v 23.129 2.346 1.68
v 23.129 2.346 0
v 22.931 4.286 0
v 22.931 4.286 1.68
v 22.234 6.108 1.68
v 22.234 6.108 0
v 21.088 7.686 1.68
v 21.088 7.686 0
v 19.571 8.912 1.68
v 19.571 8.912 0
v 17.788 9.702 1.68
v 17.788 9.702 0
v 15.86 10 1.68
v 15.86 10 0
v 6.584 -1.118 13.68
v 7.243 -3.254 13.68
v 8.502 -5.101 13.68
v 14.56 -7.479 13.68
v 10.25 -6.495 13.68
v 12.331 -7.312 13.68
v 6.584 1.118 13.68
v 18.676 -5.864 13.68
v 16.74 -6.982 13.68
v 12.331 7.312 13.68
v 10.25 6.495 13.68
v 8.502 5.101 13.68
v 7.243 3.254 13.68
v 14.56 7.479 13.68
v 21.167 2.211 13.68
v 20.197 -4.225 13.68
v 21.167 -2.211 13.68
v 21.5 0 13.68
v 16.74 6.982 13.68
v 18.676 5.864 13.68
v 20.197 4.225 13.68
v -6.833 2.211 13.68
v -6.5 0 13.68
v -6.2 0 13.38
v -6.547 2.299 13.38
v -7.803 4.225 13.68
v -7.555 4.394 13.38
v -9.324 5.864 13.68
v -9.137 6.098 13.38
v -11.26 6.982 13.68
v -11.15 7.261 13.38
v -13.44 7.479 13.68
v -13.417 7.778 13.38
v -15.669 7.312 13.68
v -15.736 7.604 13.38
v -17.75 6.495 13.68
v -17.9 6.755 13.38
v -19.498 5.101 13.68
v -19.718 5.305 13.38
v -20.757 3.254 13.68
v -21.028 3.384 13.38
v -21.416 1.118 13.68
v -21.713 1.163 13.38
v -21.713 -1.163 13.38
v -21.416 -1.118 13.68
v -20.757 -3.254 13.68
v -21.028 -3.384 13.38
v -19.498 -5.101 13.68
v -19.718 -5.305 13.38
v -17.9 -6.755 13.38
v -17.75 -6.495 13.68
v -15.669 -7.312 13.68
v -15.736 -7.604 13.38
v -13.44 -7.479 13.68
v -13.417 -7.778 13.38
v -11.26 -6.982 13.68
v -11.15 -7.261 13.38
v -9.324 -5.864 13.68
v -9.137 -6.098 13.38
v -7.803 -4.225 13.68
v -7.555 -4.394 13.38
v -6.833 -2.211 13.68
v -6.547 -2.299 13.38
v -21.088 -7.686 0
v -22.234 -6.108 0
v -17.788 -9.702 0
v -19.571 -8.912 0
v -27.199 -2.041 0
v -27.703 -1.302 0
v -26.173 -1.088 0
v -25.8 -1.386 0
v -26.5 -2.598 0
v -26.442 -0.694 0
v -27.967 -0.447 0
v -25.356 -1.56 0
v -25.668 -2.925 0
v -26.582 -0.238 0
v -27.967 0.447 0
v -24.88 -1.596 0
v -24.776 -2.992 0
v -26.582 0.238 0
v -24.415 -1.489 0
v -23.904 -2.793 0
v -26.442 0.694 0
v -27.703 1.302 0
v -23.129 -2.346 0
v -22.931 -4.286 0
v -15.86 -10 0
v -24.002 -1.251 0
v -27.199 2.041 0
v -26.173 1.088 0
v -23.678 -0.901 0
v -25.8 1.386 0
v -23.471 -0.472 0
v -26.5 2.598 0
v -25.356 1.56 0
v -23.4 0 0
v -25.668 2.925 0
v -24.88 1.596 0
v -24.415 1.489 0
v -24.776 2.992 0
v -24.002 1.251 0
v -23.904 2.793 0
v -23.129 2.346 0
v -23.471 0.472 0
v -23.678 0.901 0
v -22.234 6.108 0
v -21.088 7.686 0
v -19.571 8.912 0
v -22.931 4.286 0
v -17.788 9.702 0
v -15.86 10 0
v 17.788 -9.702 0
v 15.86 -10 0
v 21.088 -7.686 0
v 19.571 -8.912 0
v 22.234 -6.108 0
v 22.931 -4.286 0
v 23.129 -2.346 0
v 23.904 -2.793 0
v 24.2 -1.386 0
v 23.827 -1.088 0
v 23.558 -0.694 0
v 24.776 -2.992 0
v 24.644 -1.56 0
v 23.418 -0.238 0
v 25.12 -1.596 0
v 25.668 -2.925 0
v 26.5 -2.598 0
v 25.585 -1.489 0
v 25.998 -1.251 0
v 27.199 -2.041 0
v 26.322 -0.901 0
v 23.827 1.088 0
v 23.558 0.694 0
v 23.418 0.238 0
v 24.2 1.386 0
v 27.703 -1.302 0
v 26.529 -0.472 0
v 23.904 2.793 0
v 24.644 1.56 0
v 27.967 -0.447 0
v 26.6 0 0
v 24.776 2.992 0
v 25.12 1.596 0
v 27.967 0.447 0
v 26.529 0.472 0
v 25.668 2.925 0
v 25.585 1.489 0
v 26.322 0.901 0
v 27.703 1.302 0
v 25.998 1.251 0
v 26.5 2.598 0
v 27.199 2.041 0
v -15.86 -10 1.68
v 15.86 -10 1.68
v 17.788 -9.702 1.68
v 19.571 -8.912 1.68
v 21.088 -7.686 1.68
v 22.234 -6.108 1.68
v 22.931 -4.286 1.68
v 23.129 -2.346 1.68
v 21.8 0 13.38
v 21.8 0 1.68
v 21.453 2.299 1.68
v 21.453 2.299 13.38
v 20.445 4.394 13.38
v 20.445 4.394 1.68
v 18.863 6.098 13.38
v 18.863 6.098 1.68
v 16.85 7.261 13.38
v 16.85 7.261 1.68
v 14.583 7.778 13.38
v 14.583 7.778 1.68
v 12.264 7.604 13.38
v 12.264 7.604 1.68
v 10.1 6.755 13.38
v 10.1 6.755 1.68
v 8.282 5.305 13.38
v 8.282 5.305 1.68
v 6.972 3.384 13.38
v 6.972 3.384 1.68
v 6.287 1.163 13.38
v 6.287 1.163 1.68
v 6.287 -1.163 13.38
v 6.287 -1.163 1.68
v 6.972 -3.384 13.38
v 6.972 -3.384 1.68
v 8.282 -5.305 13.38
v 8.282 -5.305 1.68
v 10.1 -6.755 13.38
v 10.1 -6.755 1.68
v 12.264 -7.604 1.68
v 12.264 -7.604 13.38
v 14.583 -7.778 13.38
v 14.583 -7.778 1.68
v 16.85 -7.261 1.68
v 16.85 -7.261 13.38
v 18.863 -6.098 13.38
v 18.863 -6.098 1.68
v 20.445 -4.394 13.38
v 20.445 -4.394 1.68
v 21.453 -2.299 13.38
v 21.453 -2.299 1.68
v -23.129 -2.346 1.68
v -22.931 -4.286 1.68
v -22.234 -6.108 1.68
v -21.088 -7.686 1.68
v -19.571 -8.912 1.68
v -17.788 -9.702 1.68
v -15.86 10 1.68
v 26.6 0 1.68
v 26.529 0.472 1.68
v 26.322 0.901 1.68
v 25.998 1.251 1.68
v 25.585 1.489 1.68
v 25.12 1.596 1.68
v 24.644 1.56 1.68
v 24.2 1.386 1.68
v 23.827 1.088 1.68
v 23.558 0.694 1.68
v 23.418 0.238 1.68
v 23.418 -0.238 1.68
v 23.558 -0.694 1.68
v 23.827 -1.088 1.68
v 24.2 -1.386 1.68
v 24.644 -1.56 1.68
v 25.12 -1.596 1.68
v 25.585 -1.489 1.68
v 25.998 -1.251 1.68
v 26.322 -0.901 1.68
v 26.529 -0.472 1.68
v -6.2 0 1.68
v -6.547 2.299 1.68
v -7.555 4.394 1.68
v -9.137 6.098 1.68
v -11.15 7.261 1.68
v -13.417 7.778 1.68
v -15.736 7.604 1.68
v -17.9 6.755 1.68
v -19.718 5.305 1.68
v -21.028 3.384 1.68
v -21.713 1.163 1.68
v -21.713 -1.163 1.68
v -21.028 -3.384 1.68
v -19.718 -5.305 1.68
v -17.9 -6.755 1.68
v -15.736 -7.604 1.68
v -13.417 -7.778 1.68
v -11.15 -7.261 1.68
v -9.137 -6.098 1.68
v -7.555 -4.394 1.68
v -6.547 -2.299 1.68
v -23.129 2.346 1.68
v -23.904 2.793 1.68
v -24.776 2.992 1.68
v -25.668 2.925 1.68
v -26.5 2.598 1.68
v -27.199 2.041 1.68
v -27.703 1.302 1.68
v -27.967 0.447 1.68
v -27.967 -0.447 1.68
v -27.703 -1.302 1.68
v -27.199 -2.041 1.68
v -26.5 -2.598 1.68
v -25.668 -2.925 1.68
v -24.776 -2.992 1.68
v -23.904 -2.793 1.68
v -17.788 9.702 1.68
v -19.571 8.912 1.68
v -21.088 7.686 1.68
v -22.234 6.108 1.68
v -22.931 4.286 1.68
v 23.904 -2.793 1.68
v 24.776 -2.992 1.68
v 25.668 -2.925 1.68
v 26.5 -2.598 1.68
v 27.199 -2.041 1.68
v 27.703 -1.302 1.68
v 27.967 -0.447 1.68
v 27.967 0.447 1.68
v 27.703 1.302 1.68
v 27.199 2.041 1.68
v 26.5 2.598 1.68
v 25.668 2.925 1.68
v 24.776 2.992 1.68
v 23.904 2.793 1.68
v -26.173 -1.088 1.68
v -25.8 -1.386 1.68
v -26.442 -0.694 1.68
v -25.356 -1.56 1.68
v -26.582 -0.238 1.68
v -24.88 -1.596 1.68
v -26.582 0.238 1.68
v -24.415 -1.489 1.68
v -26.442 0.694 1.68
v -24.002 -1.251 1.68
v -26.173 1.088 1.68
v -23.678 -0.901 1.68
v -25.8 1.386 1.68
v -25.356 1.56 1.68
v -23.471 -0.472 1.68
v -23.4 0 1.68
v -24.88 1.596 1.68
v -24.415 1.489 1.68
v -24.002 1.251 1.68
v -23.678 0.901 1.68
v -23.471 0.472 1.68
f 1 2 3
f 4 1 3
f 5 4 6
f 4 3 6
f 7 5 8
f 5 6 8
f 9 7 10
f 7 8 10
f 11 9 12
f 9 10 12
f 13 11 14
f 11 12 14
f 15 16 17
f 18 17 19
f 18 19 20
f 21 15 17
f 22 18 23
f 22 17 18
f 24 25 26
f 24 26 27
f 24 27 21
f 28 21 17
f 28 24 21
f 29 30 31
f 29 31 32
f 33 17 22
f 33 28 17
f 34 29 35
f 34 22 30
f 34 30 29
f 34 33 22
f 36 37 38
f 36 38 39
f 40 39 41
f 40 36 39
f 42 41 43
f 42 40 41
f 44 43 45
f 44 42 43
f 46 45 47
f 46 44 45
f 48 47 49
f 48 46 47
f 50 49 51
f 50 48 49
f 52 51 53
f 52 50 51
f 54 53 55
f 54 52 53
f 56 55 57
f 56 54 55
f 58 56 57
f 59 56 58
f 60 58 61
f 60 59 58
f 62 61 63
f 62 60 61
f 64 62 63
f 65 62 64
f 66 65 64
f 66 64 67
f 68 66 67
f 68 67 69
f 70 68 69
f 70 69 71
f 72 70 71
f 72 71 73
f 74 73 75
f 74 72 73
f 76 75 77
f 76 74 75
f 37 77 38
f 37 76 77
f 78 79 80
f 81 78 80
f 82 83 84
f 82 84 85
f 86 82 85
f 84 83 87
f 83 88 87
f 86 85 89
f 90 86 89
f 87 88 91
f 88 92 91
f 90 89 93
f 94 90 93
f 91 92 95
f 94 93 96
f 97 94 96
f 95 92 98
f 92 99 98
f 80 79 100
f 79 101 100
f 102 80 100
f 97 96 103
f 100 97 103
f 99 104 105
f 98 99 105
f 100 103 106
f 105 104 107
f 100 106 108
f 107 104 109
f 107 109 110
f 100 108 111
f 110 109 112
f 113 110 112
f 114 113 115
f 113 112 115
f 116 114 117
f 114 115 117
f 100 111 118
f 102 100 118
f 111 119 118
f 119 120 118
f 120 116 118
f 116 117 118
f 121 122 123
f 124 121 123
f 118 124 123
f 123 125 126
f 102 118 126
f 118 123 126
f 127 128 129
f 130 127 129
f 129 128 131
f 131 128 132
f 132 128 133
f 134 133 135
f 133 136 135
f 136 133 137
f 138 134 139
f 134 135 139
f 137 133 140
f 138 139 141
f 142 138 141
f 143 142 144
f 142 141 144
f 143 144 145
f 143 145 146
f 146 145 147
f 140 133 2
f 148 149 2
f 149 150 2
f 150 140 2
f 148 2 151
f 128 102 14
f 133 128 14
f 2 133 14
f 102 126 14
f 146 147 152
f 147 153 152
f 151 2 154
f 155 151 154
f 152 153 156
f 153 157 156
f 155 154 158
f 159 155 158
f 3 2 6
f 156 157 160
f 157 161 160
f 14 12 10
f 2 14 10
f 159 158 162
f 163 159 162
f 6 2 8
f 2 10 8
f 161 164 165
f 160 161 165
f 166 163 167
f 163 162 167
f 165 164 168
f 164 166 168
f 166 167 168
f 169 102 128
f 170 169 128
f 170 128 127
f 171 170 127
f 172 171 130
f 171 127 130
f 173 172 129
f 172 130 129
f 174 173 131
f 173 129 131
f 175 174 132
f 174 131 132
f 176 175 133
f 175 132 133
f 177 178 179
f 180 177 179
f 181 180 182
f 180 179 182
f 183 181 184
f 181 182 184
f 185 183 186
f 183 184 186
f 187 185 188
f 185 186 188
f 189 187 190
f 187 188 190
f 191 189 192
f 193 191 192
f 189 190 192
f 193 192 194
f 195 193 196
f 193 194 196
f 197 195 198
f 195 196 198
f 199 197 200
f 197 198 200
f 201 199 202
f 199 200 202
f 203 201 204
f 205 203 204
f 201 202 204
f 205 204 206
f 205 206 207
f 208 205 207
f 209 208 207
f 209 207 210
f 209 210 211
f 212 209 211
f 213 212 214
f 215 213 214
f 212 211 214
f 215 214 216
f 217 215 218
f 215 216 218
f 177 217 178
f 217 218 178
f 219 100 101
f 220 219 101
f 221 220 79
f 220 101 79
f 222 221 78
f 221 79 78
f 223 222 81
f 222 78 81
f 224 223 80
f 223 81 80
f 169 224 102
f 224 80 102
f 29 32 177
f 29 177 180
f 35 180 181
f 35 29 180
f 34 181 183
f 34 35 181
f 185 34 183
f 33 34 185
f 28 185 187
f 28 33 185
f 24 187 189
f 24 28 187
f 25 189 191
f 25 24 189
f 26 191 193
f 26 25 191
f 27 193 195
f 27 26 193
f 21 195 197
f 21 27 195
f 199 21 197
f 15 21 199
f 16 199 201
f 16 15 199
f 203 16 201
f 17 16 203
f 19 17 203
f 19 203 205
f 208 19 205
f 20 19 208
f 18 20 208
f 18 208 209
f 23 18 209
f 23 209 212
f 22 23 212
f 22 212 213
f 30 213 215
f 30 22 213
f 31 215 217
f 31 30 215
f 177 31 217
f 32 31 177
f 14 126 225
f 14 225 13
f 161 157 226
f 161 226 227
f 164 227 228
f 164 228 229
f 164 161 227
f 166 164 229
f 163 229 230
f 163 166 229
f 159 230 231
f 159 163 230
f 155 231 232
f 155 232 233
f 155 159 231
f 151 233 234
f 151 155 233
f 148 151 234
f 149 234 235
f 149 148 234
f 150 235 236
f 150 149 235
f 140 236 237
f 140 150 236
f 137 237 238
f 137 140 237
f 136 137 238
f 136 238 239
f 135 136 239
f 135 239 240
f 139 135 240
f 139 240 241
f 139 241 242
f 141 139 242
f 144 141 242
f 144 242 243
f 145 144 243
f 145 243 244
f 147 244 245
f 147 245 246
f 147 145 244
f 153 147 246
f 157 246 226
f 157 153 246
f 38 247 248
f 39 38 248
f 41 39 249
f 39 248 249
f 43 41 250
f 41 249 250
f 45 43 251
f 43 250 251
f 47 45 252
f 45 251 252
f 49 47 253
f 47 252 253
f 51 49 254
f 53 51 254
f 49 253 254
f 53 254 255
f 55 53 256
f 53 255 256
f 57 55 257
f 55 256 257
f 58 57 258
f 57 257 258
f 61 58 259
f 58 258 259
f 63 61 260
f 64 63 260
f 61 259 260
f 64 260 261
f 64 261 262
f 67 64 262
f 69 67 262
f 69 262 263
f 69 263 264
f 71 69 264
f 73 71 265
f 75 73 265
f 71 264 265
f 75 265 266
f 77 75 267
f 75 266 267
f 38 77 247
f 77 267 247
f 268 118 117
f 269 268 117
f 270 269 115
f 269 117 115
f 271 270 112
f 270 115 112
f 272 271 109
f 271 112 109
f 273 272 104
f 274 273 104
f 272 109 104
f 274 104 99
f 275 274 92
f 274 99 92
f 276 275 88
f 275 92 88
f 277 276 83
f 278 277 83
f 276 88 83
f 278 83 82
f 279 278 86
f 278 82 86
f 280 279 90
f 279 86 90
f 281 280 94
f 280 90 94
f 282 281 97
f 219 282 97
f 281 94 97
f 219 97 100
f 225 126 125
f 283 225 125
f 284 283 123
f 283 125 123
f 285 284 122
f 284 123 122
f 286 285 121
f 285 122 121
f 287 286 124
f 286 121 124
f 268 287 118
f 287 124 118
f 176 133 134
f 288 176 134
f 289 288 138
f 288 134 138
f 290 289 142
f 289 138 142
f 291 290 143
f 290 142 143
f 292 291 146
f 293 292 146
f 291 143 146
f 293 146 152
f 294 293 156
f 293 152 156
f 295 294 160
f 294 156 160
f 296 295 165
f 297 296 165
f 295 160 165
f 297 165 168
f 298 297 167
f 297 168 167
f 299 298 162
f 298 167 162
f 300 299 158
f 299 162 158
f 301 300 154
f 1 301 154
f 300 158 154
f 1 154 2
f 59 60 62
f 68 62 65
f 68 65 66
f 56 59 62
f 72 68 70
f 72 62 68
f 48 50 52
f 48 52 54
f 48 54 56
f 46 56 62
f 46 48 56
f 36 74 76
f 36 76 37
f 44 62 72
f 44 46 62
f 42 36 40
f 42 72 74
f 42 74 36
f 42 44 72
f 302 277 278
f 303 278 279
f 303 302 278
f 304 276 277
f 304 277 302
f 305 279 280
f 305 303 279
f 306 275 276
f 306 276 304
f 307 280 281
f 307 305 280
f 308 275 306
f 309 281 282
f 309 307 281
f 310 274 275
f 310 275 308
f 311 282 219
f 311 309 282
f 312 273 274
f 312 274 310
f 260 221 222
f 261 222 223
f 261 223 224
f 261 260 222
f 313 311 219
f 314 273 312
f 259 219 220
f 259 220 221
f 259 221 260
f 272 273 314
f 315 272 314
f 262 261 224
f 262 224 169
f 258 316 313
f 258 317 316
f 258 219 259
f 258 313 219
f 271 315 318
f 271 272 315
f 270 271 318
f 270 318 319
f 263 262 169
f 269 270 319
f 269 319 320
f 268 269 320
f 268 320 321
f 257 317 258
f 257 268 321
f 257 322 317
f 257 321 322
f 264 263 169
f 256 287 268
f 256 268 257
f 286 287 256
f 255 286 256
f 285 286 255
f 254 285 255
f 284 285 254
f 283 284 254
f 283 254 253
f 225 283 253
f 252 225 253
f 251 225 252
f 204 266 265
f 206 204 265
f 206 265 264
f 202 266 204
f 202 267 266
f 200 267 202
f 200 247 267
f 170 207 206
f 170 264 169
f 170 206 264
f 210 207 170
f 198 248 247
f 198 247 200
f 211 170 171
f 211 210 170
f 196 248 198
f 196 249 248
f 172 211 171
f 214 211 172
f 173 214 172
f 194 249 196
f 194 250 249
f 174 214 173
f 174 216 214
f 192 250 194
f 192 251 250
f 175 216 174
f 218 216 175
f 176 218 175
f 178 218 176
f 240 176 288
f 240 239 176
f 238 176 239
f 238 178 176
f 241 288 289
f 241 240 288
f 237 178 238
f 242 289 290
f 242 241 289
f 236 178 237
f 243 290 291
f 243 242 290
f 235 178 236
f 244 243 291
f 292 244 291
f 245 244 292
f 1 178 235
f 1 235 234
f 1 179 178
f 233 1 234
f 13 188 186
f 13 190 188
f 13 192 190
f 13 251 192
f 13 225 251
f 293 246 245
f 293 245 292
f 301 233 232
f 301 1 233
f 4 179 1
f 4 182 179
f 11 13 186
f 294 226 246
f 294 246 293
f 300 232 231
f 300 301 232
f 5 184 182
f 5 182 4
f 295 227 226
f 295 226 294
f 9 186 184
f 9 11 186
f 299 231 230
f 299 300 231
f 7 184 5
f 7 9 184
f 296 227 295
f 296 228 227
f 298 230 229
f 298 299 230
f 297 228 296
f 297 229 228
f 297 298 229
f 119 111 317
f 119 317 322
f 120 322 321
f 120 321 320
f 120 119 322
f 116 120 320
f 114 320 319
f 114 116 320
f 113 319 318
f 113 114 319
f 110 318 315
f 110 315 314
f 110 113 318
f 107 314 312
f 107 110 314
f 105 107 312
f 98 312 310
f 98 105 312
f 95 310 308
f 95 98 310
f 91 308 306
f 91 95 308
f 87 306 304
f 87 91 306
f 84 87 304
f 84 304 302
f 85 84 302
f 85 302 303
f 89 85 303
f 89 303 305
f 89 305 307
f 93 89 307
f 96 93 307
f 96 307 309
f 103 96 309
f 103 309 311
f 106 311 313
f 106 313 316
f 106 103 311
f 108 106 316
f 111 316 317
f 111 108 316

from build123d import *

# Parameters (mm, degrees)
SKETCH007_R     = 1.6
PAD002_DEPTH    = 1.68
SKETCH008_R     = 7.8
PAD003_DEPTH    = 12
CHAMFER005_SIZE = 0.3


with BuildPart() as part:
    # Sketch007 → Pad002 (new body)
    with BuildSketch(Plane.XY):
        with BuildLine():
            Line((-15.86, -10), (15.86, -10))
            ThreePointArc((15.86, -10), (21.088323, -7.686238), (23.129445, -2.345574))
            ThreePointArc((23.129445, -2.345574), (28.000116, 0), (23.129445, 2.345574))
            ThreePointArc((23.129445, 2.345574), (21.088323, 7.686238), (15.86, 10))
            Line((-15.86, 10), (15.86, 10))
            ThreePointArc((-15.86, 10), (-21.088323, 7.686238), (-23.129445, 2.345574))
            ThreePointArc((-23.129445, 2.345574), (-28.000116, 0), (-23.129445, -2.345574))
            ThreePointArc((-23.129445, -2.345574), (-21.088323, -7.686238), (-15.86, -10))
        make_face()
        with Locations((-25, 0)):
            Circle(SKETCH007_R, mode=Mode.SUBTRACT)
        with Locations((25, 0)):
            Circle(SKETCH007_R, mode=Mode.SUBTRACT)
    extrude(amount=PAD002_DEPTH)

    # Sketch008 → Pad003 (new body)
    with BuildSketch(Plane.XY.offset(1.68)):
        with Locations((-14, 0)):
            Circle(SKETCH008_R)
        with Locations((14, 0)):
            Circle(SKETCH008_R)
    extrude(amount=PAD003_DEPTH)

    # Chamfer005
    chamfer005_edges = [part.edges().sort_by_distance(p)[0] for p in [
        (6.2, 0, 13.68),
        (-21.8, 0, 13.68),
    ]]
    chamfer(chamfer005_edges, length=CHAMFER005_SIZE)


solid = part.part
